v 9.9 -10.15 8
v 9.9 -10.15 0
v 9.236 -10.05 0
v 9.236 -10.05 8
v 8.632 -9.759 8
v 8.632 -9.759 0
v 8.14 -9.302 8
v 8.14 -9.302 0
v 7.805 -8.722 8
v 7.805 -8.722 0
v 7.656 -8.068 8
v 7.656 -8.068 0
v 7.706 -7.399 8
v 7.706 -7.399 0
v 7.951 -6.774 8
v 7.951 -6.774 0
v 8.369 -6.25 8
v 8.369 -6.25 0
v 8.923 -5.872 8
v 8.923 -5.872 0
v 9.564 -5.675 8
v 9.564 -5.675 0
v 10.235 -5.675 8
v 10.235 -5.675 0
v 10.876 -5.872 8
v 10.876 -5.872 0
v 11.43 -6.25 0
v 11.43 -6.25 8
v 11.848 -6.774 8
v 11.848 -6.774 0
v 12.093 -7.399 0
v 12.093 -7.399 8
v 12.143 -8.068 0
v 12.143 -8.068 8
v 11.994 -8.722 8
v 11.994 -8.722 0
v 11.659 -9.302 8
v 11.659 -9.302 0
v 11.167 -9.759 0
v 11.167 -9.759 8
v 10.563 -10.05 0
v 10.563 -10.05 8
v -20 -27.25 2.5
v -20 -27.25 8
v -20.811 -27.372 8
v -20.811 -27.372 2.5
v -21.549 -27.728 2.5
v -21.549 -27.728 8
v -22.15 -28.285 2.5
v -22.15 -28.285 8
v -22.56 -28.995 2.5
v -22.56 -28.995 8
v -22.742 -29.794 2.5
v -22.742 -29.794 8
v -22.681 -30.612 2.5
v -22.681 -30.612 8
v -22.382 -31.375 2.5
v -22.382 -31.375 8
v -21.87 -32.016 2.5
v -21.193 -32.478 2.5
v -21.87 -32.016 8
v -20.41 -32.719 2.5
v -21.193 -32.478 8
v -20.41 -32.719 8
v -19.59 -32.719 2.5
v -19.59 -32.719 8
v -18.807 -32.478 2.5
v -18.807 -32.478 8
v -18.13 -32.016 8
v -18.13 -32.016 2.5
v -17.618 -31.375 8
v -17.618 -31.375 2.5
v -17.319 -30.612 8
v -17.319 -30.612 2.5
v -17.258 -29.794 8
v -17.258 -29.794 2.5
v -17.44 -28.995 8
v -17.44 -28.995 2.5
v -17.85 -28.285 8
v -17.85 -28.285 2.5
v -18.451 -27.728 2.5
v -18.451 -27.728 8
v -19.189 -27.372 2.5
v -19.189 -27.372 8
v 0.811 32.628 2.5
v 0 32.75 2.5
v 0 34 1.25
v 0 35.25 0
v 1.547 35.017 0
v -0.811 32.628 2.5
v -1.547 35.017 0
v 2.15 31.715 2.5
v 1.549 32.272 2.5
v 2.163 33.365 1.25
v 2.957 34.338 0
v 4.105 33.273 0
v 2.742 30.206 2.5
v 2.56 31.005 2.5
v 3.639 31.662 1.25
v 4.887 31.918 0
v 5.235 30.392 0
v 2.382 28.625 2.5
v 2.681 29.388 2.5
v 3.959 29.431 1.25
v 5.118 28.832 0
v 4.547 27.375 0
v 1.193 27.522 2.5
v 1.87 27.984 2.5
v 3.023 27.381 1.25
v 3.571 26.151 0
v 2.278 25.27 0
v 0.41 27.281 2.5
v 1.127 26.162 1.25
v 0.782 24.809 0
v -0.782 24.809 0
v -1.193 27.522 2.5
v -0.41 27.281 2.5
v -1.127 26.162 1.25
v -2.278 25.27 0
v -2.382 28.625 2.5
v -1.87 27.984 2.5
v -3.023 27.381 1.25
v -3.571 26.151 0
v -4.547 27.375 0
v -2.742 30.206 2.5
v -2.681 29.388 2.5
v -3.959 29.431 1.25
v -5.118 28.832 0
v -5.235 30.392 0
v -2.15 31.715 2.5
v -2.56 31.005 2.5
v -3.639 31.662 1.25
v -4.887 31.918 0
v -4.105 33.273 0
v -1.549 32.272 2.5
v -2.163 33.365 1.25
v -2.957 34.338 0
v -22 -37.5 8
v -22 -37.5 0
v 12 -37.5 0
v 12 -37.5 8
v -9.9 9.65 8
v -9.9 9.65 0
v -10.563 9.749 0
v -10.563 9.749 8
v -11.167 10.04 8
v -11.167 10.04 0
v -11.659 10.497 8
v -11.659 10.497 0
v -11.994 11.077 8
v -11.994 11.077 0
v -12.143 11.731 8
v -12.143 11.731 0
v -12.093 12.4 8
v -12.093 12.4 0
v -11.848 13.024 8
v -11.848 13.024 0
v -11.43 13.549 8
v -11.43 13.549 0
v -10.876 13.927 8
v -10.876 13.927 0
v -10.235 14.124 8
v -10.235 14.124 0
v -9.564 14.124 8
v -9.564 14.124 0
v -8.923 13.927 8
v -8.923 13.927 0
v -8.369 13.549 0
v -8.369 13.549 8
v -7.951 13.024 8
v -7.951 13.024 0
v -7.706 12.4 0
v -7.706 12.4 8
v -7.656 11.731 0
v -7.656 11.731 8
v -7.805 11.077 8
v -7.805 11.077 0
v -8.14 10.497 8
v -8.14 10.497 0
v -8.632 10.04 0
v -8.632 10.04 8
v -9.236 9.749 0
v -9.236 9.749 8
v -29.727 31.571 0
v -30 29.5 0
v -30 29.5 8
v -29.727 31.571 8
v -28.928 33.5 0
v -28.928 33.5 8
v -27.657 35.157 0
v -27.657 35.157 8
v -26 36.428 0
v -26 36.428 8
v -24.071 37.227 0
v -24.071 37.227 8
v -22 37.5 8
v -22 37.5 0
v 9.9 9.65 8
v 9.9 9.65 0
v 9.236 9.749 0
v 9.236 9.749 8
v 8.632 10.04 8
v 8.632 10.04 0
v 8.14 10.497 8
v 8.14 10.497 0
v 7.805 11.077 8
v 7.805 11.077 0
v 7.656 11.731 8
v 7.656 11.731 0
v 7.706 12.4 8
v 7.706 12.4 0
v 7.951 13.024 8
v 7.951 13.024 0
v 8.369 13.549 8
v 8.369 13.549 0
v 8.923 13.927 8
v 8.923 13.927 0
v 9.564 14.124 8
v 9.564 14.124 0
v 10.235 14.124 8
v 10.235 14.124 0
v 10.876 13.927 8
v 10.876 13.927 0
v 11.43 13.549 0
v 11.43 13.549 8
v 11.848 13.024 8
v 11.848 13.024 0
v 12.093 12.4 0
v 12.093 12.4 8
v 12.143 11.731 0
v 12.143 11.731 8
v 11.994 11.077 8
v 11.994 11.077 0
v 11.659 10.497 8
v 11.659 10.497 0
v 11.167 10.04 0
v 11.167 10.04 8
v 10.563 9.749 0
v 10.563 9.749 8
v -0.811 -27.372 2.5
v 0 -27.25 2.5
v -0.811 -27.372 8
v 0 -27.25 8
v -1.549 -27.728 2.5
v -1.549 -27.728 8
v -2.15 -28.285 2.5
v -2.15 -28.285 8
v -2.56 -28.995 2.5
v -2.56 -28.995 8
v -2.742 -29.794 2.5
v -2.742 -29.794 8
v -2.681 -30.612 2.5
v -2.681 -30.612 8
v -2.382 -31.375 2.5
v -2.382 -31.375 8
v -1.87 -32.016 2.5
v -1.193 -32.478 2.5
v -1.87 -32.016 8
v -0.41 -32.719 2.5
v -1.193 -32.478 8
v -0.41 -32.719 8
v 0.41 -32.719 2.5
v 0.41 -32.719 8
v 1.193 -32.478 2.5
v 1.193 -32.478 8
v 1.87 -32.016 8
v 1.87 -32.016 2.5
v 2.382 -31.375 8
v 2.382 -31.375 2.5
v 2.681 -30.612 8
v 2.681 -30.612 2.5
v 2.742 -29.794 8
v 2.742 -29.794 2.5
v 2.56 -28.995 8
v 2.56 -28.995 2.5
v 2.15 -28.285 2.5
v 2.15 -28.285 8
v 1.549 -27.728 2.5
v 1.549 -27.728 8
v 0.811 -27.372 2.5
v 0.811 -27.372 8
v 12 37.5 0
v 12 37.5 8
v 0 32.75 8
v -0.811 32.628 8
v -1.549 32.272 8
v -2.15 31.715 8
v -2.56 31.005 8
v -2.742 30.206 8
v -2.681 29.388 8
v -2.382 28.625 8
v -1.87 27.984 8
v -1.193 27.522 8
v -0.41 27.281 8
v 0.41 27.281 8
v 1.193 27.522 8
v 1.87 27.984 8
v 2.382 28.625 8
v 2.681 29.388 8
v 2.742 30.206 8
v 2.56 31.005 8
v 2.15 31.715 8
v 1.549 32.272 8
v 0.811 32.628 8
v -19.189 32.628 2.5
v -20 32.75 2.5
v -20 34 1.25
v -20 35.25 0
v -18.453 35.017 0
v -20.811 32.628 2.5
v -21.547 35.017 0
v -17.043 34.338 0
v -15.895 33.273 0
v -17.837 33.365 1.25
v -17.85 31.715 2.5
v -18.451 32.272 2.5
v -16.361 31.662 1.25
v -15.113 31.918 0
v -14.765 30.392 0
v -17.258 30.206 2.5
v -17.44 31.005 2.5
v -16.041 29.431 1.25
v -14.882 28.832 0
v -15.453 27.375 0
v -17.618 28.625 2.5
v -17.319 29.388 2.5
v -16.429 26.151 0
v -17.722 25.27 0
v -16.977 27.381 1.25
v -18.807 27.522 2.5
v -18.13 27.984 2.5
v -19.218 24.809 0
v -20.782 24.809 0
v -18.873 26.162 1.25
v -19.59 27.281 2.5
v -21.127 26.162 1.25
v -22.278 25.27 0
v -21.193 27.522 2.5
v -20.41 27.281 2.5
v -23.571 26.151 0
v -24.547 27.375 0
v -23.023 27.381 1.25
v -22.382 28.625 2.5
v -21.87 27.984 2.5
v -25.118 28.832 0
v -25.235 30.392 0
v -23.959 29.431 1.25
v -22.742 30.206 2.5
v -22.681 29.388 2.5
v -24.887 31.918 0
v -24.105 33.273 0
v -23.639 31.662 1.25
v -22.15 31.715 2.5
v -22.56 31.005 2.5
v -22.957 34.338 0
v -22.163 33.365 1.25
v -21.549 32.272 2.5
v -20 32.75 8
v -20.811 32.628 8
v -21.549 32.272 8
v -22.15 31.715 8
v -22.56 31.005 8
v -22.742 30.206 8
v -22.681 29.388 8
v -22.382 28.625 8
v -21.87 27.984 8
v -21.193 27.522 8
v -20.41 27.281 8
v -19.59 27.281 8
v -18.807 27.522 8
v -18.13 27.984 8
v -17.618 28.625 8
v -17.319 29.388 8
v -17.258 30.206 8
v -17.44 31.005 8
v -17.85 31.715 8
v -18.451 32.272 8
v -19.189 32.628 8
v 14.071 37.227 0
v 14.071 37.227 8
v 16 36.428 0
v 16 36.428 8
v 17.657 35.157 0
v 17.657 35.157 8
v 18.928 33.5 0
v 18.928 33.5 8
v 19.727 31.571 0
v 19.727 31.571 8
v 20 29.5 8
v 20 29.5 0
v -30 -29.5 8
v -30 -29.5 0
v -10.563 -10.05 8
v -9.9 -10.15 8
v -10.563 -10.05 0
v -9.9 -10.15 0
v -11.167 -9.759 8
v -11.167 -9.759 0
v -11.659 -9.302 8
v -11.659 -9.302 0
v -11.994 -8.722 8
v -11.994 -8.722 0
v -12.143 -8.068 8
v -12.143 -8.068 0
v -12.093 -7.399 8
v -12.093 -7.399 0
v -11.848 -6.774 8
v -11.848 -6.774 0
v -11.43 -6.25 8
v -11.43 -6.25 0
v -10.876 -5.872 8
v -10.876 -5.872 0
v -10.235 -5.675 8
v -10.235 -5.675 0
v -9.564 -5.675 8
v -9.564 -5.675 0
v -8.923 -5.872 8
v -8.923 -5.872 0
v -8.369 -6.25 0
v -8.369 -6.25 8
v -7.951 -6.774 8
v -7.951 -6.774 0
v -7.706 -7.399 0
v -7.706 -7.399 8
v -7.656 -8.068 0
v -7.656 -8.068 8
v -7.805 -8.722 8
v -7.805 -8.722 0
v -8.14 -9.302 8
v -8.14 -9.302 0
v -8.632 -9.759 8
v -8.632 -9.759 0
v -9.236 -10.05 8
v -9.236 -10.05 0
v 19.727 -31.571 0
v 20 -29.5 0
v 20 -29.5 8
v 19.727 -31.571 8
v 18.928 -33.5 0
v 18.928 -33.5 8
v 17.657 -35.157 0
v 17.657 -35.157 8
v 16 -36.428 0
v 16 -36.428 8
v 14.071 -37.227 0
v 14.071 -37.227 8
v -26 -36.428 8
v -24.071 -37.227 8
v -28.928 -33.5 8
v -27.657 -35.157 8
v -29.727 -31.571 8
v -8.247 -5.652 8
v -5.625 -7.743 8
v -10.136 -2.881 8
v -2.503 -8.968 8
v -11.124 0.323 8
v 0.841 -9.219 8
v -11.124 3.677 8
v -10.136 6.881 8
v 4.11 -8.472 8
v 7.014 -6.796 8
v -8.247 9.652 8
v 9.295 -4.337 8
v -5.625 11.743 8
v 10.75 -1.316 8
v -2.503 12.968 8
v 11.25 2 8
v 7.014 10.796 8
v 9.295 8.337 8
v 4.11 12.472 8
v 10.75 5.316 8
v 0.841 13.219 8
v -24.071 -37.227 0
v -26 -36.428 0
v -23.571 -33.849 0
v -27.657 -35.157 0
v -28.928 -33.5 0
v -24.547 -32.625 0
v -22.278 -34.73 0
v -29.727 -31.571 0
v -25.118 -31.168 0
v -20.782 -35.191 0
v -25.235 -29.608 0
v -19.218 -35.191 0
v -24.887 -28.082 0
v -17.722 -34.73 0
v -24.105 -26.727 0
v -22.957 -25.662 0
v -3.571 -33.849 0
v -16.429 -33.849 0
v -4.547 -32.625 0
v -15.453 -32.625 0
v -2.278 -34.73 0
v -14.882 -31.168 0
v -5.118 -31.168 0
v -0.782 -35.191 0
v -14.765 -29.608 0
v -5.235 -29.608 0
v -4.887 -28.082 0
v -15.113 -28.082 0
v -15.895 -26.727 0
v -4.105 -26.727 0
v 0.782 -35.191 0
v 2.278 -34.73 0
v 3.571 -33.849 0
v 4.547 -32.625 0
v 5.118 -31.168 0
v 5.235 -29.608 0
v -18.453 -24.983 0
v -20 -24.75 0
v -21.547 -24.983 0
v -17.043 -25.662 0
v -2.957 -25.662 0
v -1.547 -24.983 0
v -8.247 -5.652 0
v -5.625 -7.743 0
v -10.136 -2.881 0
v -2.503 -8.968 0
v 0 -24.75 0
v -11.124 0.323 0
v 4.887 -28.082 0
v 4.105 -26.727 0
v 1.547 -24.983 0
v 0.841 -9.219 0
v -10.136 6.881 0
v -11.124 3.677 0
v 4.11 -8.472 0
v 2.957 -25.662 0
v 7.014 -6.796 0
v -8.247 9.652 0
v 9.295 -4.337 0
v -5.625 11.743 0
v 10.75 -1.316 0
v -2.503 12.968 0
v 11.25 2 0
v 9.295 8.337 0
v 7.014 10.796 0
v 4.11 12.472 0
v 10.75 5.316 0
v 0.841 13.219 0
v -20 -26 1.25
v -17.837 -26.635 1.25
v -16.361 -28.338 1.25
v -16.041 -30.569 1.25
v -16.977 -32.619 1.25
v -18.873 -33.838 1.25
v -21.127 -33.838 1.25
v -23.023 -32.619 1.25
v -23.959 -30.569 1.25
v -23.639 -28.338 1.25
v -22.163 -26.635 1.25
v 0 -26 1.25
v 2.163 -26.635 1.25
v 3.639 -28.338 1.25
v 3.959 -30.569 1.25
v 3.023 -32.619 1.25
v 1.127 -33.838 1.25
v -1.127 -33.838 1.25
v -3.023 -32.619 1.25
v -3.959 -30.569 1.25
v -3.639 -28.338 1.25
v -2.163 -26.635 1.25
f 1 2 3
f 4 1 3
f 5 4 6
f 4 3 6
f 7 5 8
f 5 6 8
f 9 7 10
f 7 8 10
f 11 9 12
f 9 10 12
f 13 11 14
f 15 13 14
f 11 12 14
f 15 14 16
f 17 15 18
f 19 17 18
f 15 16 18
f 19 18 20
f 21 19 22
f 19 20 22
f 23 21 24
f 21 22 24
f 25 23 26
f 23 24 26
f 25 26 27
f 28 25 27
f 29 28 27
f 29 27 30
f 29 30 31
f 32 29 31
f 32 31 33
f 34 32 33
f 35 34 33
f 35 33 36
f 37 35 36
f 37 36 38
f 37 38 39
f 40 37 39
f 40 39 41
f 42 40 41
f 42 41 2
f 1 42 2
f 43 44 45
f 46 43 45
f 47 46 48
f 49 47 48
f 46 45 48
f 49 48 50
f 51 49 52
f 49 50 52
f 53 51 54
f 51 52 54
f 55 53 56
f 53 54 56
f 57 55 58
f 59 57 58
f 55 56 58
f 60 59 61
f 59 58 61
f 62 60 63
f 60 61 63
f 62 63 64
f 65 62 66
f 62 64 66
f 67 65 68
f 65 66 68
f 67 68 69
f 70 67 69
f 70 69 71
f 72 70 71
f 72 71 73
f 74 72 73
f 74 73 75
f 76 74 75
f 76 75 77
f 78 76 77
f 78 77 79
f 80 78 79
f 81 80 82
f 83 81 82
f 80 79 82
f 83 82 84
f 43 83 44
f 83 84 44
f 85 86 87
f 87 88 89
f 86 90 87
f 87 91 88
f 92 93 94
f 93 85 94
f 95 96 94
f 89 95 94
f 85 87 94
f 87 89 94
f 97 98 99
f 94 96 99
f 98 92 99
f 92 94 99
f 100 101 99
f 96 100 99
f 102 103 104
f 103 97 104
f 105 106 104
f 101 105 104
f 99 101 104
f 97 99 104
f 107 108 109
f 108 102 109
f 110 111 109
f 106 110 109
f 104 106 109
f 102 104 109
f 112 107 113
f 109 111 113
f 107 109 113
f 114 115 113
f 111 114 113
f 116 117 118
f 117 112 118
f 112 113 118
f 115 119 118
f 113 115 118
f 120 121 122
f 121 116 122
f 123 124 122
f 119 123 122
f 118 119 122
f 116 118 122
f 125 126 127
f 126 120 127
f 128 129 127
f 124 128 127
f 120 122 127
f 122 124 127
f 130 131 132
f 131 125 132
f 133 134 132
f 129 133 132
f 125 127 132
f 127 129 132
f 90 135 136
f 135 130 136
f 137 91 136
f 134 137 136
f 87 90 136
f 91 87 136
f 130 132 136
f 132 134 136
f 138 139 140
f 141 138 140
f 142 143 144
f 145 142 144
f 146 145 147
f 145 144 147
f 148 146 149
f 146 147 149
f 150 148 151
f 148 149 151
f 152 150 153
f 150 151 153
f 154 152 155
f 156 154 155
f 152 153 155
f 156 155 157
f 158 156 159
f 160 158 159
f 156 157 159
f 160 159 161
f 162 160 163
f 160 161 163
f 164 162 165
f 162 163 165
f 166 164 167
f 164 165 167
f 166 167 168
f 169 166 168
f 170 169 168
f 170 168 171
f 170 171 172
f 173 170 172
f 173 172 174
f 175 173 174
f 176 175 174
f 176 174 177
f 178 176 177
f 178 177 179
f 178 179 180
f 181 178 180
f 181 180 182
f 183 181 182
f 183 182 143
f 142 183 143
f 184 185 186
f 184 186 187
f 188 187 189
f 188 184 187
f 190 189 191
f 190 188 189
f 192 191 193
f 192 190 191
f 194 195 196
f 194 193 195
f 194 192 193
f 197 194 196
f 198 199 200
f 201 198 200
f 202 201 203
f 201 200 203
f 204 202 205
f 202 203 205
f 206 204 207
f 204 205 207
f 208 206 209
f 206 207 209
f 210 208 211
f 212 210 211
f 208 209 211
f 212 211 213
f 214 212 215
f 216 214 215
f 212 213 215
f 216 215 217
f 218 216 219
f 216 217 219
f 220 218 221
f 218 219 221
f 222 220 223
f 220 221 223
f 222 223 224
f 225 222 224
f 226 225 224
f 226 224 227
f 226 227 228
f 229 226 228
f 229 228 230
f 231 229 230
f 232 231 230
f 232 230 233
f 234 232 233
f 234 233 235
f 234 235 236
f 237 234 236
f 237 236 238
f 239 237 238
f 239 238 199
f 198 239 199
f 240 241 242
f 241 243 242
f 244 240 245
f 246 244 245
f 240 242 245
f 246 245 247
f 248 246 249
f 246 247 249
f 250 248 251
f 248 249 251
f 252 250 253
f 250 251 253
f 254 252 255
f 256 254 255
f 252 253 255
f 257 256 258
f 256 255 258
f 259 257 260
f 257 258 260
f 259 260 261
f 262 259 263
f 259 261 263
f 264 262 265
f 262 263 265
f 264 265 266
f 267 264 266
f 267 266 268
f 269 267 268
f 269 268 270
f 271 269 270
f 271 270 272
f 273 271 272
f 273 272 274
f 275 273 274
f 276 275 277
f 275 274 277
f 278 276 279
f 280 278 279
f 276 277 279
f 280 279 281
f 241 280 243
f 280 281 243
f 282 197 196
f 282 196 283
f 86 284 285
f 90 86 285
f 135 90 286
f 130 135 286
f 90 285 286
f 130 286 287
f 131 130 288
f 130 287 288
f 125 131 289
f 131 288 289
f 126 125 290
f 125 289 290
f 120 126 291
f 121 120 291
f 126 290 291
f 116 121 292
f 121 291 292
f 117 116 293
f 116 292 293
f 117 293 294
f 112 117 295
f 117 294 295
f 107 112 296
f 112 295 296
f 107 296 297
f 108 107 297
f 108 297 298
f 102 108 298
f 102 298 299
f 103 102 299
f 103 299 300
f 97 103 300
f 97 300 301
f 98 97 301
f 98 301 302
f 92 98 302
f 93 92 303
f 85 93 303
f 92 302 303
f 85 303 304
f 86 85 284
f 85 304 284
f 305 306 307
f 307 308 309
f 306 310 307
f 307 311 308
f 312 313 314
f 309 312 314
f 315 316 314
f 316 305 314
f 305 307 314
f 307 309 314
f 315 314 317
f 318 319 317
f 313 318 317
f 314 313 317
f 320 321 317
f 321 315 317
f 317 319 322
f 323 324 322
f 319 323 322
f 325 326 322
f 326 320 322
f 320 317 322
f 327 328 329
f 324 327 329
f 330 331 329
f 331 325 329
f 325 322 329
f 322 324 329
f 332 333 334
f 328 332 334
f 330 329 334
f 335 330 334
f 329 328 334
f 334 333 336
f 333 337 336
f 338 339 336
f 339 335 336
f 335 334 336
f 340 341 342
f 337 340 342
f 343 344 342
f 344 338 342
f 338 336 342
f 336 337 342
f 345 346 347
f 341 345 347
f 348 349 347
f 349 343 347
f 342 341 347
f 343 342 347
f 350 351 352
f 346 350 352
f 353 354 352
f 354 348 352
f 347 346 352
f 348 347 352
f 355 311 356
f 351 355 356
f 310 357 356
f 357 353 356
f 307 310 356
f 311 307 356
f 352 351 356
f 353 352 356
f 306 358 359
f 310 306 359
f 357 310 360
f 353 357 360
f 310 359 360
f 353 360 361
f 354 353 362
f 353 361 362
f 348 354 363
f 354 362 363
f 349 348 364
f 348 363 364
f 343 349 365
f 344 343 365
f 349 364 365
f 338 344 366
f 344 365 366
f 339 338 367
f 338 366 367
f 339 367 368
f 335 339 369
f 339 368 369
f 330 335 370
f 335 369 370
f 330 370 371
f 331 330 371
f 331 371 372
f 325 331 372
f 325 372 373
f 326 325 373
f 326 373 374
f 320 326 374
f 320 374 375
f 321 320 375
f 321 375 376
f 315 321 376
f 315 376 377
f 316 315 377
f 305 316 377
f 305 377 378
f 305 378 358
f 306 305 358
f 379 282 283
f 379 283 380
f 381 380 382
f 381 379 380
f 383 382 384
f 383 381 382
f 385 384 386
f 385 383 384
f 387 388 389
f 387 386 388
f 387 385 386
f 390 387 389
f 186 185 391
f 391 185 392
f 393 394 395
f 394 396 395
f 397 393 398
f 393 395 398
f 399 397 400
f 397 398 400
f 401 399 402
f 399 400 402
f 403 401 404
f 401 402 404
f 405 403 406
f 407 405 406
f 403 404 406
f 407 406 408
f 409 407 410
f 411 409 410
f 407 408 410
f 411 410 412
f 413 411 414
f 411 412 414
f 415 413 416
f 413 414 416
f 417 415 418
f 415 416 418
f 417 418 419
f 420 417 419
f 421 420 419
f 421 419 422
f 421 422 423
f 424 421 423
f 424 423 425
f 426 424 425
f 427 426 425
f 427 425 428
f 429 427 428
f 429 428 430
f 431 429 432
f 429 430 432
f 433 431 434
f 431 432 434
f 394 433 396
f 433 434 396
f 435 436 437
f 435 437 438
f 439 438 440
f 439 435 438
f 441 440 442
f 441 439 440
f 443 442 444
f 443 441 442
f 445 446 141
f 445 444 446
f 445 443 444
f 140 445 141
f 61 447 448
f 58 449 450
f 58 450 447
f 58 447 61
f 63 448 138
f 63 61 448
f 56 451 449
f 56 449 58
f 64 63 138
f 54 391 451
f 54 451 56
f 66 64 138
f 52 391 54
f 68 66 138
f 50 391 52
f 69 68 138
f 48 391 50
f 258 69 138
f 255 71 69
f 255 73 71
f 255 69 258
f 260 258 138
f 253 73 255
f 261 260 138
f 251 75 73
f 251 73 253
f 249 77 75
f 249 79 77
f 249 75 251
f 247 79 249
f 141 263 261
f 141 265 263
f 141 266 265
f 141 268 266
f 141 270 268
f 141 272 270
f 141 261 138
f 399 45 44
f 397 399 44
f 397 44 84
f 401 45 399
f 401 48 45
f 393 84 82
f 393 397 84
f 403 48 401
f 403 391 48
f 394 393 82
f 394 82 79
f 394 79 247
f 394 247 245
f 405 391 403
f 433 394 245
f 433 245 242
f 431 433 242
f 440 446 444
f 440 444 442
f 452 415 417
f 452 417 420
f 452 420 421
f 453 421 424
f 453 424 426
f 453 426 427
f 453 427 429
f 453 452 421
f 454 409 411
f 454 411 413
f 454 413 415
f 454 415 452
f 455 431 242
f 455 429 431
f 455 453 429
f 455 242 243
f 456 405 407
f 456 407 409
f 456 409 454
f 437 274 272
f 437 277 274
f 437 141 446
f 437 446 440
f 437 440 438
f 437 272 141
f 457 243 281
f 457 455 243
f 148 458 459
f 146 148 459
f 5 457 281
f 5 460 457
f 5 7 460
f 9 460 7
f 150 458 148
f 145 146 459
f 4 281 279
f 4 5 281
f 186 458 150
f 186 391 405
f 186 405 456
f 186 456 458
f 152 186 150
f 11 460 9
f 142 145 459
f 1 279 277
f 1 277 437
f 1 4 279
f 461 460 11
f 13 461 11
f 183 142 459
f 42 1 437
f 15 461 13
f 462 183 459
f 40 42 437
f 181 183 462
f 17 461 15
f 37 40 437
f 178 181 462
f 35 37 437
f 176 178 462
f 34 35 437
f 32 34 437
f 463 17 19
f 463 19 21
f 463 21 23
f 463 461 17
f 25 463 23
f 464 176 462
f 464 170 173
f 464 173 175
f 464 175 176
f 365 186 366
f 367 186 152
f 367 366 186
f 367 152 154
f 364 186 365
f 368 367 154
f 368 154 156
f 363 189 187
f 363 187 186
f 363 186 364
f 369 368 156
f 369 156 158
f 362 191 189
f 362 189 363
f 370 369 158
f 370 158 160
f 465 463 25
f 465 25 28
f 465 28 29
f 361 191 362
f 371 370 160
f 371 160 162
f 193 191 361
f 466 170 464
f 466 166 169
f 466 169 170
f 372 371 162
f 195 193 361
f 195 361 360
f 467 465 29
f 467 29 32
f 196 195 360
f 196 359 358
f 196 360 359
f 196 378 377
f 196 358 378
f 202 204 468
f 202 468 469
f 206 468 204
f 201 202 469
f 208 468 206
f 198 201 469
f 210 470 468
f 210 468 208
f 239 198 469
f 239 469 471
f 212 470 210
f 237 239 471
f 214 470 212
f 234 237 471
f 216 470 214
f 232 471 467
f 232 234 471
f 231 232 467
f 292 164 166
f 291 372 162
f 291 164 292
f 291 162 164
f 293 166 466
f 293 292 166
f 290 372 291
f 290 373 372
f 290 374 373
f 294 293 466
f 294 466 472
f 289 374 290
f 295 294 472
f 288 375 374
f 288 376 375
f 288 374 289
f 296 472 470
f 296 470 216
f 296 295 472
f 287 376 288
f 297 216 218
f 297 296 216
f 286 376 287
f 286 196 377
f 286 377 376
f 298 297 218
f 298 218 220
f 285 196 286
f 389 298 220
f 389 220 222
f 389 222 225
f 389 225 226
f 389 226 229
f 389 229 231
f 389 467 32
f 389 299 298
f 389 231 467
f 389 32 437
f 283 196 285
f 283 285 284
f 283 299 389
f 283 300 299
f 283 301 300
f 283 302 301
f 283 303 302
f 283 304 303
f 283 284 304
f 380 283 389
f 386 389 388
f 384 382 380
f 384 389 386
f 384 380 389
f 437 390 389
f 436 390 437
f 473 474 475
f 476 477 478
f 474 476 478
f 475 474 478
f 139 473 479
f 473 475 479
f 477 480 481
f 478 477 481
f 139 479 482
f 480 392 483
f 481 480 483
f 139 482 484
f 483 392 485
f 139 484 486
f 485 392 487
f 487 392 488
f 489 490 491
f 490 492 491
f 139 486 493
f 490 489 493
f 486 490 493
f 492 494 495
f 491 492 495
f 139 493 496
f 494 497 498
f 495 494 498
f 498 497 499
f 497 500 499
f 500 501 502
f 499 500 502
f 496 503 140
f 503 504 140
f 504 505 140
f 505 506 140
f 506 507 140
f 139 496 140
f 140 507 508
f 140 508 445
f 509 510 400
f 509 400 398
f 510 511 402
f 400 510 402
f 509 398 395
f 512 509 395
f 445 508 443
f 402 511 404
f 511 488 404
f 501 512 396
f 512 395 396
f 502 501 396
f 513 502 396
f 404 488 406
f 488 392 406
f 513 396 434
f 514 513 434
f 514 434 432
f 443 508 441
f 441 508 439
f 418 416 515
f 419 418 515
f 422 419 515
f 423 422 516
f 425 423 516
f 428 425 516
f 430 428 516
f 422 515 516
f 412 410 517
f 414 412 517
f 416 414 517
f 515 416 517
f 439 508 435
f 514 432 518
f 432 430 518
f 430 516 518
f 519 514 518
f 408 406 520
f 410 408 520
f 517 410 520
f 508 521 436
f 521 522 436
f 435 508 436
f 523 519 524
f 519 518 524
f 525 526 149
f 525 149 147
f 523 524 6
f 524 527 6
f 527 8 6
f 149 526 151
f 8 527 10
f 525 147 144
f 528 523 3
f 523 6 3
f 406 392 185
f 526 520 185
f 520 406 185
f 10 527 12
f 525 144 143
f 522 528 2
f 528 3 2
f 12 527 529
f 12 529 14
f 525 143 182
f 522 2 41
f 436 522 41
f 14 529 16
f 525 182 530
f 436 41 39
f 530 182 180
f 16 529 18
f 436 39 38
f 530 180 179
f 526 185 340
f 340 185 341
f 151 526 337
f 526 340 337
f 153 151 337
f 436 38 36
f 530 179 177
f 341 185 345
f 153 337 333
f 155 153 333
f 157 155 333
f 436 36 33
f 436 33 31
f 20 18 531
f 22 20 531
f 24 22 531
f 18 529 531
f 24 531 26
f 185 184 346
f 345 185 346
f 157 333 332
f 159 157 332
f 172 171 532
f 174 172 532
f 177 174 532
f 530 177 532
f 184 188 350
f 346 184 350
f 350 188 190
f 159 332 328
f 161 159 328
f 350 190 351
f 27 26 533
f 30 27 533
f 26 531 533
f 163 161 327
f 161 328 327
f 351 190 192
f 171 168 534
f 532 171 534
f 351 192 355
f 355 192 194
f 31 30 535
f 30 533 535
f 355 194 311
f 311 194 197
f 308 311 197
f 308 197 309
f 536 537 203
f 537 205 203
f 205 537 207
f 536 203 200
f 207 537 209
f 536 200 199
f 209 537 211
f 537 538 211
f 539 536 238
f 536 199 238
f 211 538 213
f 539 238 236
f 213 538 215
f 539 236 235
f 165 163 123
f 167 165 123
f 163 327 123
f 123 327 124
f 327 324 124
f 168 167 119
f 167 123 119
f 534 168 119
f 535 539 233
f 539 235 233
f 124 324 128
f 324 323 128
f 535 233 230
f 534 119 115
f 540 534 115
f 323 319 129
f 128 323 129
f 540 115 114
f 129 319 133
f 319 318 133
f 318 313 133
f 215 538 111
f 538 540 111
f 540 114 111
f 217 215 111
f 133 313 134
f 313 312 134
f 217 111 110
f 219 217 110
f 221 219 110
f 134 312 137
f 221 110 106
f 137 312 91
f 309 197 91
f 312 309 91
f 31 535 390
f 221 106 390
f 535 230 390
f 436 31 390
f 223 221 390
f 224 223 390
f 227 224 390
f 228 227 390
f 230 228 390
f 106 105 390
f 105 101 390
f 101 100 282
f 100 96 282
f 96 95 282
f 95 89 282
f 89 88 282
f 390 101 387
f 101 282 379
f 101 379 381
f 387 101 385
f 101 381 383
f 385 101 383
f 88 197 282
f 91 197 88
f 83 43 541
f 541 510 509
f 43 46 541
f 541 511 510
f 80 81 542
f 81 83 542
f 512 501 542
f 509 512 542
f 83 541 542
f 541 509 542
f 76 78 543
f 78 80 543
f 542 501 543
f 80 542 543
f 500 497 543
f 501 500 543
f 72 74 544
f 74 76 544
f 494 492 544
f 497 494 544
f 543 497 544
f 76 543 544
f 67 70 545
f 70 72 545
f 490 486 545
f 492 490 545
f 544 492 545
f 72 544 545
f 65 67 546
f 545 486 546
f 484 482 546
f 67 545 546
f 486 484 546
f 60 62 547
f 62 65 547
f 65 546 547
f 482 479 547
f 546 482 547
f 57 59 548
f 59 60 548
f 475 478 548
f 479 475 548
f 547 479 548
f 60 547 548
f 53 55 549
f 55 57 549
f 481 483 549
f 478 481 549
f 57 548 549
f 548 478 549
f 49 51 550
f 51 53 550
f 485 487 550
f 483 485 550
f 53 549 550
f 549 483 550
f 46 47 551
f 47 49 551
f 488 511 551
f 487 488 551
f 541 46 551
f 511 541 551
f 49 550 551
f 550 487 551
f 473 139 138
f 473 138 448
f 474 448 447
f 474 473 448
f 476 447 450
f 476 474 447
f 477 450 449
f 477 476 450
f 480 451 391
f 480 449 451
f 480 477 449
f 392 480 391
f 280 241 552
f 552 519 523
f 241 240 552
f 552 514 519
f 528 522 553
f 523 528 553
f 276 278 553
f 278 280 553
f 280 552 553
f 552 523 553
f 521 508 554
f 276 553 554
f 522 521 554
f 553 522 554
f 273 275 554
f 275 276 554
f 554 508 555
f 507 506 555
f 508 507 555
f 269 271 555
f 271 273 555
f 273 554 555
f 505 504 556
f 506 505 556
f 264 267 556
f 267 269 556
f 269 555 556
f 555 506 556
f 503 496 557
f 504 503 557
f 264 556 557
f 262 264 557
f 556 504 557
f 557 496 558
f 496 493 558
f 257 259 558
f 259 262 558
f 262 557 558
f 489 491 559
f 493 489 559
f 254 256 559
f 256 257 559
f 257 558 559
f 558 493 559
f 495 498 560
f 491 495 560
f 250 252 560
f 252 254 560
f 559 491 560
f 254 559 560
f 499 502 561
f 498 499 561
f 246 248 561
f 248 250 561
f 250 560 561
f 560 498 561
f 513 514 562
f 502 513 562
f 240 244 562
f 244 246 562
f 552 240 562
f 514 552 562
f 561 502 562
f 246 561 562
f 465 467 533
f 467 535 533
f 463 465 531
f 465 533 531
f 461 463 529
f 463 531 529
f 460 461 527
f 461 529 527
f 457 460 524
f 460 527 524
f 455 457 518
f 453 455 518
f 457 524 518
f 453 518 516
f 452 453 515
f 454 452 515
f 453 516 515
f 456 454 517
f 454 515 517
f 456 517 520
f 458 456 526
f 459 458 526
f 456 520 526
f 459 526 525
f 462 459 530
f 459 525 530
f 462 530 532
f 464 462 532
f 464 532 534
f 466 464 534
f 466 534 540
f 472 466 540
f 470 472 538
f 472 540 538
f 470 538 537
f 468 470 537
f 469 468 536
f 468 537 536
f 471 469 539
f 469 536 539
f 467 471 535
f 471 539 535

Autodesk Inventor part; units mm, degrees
ref_plane "YZ Plane" through (0, 0, 0) normal (1, 0, 0) x (0, 1, 0)
ref_plane "XZ Plane" through (0, 0, 0) normal (0, 1, 0) x (-1, 0, 0)
ref_plane "XY Plane" through (0, 0, 0) normal (0, 0, 1) x (1, 0, 0)
sketch "Эскиз1" plane through (0, 0, 0) normal (0, 0, 1) x (1, 0, 0)
  line L0 (-1.5933, 37.5) -> (12, 37.5)
  line L1 (20, 29.5) -> (20, -29.5)
  arc A0 (20, 29.5) -> (12, 37.5) centre (12, 29.5) ccw
  line L2 (-1.5933, 37.5) -> (-22, 37.5)
  line L3 (-30, 29.5) -> (-30, -29.5)
  arc A1 (-22, 37.5) -> (-30, 29.5) centre (-22, 29.5) ccw
  line L4 (-42.3196, 0) -> (32.3196, 0) projected
  line L5 (0, -54.8196) -> (0, 54.8196) projected
  circle A2 centre (0, 2) radius 11.25
  circle A3 centre (0, 2) radius 14 construction
  line L6 (0, 2) -> (-9.8995, 11.8995) construction
  line L7 (-22, -37.5) -> (12, -37.5)
  arc A4 (-30, -29.5) -> (-22, -37.5) centre (-22, -29.5) ccw
  arc A5 (12, -37.5) -> (20, -29.5) centre (12, -29.5) ccw
  line L8 (0, 30) -> (-20, 30) construction
  line L9 (0, -30) -> (-20, -30) construction
  point P0 (0, 0)
  point P1 (0, 0)
  point P2 (0, 54.8196)
  point P3 (9.8995, 11.8995)
  point P4 (-9.8995, -7.8995)
  point P5 (9.8995, -7.8995)
  point P6 (20, 0)
  dimension "d128" = 28
  dimension "d43" = 8
  dimension "d50" = 20
  dimension "d127" = 22.5
  dimension "d131" = 360
  dimension "d134" = 45
  dimension "d168" = 7.5
  dimension "d182" = 2
  dimension "d200" = 20
  dimension "d201" = 50
  dimension "d202" = 75
extrude "Пластина2" add sketch "Эскиз1" along normal blind 8 contours L0 L5 A2 L4 L3 A1 L2 | L0 A0 L1 L4 A2 L5 | A2 L5 L7 A4 L3 L4 | L1 A5 L7 L5 A2 L4
hole "Отверстие2" at (-20, 30, 0) at (0, 30, 0) at (0, -30, 0) at (-20, -30, 0) direction (0, 0, 1) diameter 5.5 end through all countersink diameter 10.5 countersink angle 90
sketch "Эскиз6" plane through (0, 0, 8) normal (0, 0, 1) x (1, 0, 0)
  circle A0 centre (0, 2) radius 14 construction
  line L0 (0, -54.8196) -> (0, 54.8196) projected
  line L1 (-42.3196, 0) -> (32.3196, 0) projected
  line L2 (0, 2) -> (9.8995, 11.8995) construction
  point P0 (-9.8995, 11.8995)
  point P1 (-9.8995, -7.8995)
  point P2 (9.8995, -7.8995)
  dimension "d135" = 28
  dimension "d138" = 360
  dimension "d141" = 135
  dimension "d183" = 2
hole "Отверстие3" at (-9.8995, -7.8995, 8) at (9.8995, 11.8995, 8) at (-9.8995, 11.8995, 8) at (9.8995, -7.8995, 8) direction (0, 0, -1) diameter 4.5 end through all
equation "\"d18\" = Толщина"
equation "\"Радиус_гибки\" = Толщина"
equation "\"Ширина_просечки\" = Толщина"
equation "\"Глубина_просечки\" = 0.5 * Толщина"
equation "\"Размер_просечки\" = 4 * Толщина"
equation "\"Мин_остаток\" = 2 * Толщина"
equation "\"Радиус_перехода\" = Радиус_гибки"
equation "\"Радиус_Якоби\" = Радиус_гибки"
equation "\"Размер_зазора\" = Толщина"
equation "\"Толщина\" = 8"
properties part number "кронштейн" material "Сталь"
